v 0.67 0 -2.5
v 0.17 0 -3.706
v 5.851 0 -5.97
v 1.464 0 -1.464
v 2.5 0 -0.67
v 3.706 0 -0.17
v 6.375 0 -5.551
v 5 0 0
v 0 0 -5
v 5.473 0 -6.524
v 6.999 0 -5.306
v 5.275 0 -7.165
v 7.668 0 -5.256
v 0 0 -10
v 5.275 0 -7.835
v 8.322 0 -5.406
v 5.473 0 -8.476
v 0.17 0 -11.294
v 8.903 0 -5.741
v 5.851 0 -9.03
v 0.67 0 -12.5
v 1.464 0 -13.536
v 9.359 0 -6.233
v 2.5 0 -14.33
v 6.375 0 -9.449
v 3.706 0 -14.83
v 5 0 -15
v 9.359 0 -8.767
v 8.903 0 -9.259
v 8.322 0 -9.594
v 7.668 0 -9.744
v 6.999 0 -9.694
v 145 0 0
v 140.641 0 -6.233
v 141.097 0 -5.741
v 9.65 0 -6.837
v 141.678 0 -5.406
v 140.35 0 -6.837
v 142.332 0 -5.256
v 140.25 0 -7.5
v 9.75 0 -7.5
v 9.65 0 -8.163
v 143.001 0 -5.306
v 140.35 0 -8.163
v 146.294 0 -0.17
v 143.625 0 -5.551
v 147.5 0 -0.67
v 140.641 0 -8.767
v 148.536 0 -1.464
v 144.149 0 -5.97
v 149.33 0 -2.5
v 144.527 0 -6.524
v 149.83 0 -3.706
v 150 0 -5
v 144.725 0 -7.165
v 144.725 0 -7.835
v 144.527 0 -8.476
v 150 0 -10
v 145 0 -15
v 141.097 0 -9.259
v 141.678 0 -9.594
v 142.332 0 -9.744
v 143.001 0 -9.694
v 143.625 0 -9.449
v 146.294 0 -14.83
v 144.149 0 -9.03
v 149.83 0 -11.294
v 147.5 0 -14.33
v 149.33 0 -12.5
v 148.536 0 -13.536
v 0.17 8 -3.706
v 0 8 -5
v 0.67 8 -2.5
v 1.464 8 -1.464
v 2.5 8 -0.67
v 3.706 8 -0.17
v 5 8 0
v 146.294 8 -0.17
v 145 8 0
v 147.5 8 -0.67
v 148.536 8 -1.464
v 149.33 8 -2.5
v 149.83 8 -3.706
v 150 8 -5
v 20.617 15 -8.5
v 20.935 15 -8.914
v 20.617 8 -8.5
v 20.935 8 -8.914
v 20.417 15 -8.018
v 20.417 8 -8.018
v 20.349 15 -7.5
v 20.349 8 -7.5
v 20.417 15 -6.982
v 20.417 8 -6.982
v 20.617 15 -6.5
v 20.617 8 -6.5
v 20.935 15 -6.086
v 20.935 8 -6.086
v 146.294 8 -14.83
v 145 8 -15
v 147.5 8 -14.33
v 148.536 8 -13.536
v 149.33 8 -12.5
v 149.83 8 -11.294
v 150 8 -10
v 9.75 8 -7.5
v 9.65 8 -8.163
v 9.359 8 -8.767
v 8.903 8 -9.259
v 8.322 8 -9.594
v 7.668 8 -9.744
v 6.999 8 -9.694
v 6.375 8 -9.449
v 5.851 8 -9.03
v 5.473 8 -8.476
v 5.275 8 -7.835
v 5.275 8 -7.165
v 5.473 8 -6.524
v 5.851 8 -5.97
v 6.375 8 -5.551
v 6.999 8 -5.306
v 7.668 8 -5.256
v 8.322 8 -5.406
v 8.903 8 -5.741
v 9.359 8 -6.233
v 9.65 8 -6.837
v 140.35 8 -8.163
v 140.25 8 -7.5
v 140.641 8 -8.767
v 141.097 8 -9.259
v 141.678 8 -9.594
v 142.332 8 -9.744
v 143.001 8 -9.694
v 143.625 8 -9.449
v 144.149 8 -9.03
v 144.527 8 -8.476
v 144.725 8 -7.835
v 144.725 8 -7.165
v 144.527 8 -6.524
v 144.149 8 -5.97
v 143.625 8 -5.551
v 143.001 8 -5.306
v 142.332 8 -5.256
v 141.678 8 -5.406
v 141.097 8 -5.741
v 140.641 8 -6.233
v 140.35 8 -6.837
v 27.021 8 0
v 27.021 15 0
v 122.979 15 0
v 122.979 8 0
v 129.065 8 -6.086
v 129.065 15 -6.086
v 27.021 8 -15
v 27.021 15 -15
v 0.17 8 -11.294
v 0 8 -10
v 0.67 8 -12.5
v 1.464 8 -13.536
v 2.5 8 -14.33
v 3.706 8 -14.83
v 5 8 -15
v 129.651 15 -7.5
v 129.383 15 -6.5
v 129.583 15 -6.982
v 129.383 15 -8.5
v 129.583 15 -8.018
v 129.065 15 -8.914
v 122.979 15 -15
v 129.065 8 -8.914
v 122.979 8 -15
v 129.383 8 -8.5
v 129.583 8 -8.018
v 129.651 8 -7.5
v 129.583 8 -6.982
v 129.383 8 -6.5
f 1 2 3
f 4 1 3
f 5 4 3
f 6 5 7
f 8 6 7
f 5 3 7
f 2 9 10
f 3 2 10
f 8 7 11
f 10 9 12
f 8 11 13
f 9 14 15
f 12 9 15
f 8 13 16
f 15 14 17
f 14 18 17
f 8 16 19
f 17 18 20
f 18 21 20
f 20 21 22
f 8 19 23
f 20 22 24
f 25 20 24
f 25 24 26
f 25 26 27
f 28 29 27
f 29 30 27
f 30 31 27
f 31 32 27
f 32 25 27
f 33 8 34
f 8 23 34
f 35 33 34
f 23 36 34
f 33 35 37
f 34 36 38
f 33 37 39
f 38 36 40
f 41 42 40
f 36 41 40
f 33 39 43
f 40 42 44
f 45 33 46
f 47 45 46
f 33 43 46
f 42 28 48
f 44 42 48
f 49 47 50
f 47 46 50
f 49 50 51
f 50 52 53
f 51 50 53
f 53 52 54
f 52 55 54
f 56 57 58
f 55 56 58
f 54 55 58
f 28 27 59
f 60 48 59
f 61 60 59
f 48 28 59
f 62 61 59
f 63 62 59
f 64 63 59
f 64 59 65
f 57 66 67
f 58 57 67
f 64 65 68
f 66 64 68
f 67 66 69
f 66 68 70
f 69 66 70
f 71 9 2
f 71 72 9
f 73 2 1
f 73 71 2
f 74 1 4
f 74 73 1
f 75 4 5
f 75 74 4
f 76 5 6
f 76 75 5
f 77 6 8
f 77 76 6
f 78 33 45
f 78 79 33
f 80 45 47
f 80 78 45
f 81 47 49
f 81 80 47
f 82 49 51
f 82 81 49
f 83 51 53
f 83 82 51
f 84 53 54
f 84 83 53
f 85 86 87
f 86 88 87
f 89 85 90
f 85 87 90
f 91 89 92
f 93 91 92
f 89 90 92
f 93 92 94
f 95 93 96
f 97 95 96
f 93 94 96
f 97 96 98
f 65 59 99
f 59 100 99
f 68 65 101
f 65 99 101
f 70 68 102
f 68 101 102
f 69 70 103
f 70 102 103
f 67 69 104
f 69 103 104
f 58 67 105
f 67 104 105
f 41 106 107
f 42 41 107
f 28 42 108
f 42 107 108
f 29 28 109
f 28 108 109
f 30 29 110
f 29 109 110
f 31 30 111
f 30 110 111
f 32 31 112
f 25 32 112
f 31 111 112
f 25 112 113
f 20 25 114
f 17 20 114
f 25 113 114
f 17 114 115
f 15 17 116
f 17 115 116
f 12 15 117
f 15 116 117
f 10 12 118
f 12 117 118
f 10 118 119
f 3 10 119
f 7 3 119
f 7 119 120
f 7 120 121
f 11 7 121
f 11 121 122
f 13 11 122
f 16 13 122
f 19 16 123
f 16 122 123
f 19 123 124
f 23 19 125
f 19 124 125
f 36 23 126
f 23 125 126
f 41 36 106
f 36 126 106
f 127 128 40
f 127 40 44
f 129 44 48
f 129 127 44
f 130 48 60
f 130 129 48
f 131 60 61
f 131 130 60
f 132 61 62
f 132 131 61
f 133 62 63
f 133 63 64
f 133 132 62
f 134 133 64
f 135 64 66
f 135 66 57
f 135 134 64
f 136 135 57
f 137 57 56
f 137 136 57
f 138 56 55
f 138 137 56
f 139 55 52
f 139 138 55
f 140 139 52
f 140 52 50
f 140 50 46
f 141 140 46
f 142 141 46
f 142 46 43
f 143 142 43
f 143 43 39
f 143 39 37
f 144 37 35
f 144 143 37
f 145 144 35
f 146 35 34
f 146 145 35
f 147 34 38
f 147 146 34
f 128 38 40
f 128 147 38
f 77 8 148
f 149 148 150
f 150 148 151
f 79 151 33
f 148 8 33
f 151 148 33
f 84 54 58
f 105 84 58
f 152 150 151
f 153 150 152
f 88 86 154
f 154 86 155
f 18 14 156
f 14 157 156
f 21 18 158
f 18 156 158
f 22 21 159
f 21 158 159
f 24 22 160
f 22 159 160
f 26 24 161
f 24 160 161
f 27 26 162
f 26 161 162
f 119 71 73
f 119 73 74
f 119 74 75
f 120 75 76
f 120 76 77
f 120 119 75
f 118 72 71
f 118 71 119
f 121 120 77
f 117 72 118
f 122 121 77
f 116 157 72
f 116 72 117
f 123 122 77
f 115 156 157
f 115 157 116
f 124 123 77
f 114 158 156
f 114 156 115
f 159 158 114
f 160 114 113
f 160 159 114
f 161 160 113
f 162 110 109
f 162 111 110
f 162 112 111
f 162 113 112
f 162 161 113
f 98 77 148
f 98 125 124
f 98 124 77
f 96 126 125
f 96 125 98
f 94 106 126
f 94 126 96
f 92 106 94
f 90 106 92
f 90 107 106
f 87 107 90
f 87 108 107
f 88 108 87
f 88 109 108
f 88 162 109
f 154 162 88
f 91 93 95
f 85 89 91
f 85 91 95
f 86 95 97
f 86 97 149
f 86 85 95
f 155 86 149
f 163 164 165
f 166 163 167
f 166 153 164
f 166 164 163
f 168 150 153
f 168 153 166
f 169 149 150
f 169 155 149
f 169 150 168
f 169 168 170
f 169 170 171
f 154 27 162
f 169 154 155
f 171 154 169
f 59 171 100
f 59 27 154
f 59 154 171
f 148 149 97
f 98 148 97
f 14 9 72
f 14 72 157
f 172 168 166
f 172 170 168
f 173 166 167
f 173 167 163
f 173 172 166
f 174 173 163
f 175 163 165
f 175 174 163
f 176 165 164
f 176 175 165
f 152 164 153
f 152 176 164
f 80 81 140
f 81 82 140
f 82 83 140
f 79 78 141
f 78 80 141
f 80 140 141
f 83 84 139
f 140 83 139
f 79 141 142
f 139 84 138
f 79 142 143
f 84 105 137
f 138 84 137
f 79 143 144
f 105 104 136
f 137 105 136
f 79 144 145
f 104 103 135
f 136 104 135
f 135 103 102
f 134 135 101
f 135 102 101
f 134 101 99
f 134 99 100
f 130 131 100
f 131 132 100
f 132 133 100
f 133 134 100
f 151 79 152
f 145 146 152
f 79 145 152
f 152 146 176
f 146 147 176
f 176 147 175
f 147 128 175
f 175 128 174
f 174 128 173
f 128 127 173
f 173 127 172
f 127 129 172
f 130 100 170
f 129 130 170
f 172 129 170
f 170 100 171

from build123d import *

# Parameters (mm, degrees)
SKETCH1_W            = 150
SKETCH1_H            = 15
BOSS_EXTRUDE1_DEPTH  = 15
SKETCH2_W            = 16
SKETCH2_H            = 15
CUT_EXTRUDE1_DEPTH   = 7
SKETCH3_R            = 2.25
CUT_EXTRUDE2_DEPTH   = 8
FILLET1_R            = 5
CUT_EXTRUDE3_DEPTH   = 7
FILLET2_R            = 2
FILLET2_OF_MIRROR2_R = 2


with BuildPart() as part:
    # Sketch1 → Boss-Extrude1 (new body)
    with BuildSketch(Plane(origin=(0, 0, 0), x_dir=(1, 0, 0), z_dir=(0, 1, 0))):
        with Locations((75, 7.5)):
            Rectangle(SKETCH1_W, SKETCH1_H)
    extrude(amount=BOSS_EXTRUDE1_DEPTH)

    # Sketch2 → Cut-Extrude1 (cut)
    with BuildSketch(Plane(origin=(0, 15, 0), x_dir=(1, 0, 0), z_dir=(0, 1, 0))):
        with Locations((8, 7.5)):
            Rectangle(SKETCH2_W, SKETCH2_H)
    cut_extrude1 = extrude(amount=-CUT_EXTRUDE1_DEPTH, mode=Mode.SUBTRACT)

    # Sketch3 → Cut-Extrude2 (cut)
    with BuildSketch(Plane(origin=(0, 8, 0), x_dir=(1, 0, 0), z_dir=(0, 1, 0))):
        with Locations((7.5, 7.5)):
            Circle(SKETCH3_R)
    cut_extrude2 = extrude(amount=-CUT_EXTRUDE2_DEPTH, mode=Mode.SUBTRACT)

    # Mirror1: Cut-Extrude1, Cut-Extrude2 across plane
    add(cut_extrude1.mirror(Plane(origin=(75, 0, 0), x_dir=(0, 0, 1), z_dir=(1, 0, 0))), mode=Mode.SUBTRACT)
    add(cut_extrude2.mirror(Plane(origin=(75, 0, 0), x_dir=(0, 0, 1), z_dir=(1, 0, 0))), mode=Mode.SUBTRACT)

    # Fillet1
    fillet1_edges = [part.edges().sort_by_distance(p)[0] for p in [
        (0, 4, -15),
        (0, 4, 0),
        (150, 4, -15),
        (150, 4, 0),
    ]]
    fillet(fillet1_edges, radius=FILLET1_R)

    # Sketch4 → Cut-Extrude3 (cut)
    with BuildSketch(Plane(origin=(0, 15, 0), x_dir=(1, 0, 0), z_dir=(0, 1, 0))):
        Polygon((19.52081528, 7.5), (16, 11.02081528), (16, 0), (27.02081528, 0), align=None)
        Polygon((16, 15), (16, 11.02081528), (19.52081528, 7.5), (27.02081528, 15), align=None)
    cut_extrude3 = extrude(amount=-CUT_EXTRUDE3_DEPTH, mode=Mode.SUBTRACT)

    # Fillet2
    fillet2_edges = [part.edges().sort_by_distance(p)[0] for p in [
        (19.52081528, 11.5, -7.5),
    ]]
    fillet(fillet2_edges, radius=FILLET2_R)

    # Mirror2: Cut-Extrude3 across plane
    add(cut_extrude3.mirror(Plane(origin=(75, 0, 0), x_dir=(0, 0, 1), z_dir=(1, 0, 0))), mode=Mode.SUBTRACT)

    # Fillet2 of Mirror2
    fillet2_of_mirror2_edges = [part.edges().sort_by_distance(p)[0] for p in [
        (130.47918472, 11.5, -7.5),
    ]]
    fillet(fillet2_of_mirror2_edges, radius=FILLET2_OF_MIRROR2_R)


solid = part.part
